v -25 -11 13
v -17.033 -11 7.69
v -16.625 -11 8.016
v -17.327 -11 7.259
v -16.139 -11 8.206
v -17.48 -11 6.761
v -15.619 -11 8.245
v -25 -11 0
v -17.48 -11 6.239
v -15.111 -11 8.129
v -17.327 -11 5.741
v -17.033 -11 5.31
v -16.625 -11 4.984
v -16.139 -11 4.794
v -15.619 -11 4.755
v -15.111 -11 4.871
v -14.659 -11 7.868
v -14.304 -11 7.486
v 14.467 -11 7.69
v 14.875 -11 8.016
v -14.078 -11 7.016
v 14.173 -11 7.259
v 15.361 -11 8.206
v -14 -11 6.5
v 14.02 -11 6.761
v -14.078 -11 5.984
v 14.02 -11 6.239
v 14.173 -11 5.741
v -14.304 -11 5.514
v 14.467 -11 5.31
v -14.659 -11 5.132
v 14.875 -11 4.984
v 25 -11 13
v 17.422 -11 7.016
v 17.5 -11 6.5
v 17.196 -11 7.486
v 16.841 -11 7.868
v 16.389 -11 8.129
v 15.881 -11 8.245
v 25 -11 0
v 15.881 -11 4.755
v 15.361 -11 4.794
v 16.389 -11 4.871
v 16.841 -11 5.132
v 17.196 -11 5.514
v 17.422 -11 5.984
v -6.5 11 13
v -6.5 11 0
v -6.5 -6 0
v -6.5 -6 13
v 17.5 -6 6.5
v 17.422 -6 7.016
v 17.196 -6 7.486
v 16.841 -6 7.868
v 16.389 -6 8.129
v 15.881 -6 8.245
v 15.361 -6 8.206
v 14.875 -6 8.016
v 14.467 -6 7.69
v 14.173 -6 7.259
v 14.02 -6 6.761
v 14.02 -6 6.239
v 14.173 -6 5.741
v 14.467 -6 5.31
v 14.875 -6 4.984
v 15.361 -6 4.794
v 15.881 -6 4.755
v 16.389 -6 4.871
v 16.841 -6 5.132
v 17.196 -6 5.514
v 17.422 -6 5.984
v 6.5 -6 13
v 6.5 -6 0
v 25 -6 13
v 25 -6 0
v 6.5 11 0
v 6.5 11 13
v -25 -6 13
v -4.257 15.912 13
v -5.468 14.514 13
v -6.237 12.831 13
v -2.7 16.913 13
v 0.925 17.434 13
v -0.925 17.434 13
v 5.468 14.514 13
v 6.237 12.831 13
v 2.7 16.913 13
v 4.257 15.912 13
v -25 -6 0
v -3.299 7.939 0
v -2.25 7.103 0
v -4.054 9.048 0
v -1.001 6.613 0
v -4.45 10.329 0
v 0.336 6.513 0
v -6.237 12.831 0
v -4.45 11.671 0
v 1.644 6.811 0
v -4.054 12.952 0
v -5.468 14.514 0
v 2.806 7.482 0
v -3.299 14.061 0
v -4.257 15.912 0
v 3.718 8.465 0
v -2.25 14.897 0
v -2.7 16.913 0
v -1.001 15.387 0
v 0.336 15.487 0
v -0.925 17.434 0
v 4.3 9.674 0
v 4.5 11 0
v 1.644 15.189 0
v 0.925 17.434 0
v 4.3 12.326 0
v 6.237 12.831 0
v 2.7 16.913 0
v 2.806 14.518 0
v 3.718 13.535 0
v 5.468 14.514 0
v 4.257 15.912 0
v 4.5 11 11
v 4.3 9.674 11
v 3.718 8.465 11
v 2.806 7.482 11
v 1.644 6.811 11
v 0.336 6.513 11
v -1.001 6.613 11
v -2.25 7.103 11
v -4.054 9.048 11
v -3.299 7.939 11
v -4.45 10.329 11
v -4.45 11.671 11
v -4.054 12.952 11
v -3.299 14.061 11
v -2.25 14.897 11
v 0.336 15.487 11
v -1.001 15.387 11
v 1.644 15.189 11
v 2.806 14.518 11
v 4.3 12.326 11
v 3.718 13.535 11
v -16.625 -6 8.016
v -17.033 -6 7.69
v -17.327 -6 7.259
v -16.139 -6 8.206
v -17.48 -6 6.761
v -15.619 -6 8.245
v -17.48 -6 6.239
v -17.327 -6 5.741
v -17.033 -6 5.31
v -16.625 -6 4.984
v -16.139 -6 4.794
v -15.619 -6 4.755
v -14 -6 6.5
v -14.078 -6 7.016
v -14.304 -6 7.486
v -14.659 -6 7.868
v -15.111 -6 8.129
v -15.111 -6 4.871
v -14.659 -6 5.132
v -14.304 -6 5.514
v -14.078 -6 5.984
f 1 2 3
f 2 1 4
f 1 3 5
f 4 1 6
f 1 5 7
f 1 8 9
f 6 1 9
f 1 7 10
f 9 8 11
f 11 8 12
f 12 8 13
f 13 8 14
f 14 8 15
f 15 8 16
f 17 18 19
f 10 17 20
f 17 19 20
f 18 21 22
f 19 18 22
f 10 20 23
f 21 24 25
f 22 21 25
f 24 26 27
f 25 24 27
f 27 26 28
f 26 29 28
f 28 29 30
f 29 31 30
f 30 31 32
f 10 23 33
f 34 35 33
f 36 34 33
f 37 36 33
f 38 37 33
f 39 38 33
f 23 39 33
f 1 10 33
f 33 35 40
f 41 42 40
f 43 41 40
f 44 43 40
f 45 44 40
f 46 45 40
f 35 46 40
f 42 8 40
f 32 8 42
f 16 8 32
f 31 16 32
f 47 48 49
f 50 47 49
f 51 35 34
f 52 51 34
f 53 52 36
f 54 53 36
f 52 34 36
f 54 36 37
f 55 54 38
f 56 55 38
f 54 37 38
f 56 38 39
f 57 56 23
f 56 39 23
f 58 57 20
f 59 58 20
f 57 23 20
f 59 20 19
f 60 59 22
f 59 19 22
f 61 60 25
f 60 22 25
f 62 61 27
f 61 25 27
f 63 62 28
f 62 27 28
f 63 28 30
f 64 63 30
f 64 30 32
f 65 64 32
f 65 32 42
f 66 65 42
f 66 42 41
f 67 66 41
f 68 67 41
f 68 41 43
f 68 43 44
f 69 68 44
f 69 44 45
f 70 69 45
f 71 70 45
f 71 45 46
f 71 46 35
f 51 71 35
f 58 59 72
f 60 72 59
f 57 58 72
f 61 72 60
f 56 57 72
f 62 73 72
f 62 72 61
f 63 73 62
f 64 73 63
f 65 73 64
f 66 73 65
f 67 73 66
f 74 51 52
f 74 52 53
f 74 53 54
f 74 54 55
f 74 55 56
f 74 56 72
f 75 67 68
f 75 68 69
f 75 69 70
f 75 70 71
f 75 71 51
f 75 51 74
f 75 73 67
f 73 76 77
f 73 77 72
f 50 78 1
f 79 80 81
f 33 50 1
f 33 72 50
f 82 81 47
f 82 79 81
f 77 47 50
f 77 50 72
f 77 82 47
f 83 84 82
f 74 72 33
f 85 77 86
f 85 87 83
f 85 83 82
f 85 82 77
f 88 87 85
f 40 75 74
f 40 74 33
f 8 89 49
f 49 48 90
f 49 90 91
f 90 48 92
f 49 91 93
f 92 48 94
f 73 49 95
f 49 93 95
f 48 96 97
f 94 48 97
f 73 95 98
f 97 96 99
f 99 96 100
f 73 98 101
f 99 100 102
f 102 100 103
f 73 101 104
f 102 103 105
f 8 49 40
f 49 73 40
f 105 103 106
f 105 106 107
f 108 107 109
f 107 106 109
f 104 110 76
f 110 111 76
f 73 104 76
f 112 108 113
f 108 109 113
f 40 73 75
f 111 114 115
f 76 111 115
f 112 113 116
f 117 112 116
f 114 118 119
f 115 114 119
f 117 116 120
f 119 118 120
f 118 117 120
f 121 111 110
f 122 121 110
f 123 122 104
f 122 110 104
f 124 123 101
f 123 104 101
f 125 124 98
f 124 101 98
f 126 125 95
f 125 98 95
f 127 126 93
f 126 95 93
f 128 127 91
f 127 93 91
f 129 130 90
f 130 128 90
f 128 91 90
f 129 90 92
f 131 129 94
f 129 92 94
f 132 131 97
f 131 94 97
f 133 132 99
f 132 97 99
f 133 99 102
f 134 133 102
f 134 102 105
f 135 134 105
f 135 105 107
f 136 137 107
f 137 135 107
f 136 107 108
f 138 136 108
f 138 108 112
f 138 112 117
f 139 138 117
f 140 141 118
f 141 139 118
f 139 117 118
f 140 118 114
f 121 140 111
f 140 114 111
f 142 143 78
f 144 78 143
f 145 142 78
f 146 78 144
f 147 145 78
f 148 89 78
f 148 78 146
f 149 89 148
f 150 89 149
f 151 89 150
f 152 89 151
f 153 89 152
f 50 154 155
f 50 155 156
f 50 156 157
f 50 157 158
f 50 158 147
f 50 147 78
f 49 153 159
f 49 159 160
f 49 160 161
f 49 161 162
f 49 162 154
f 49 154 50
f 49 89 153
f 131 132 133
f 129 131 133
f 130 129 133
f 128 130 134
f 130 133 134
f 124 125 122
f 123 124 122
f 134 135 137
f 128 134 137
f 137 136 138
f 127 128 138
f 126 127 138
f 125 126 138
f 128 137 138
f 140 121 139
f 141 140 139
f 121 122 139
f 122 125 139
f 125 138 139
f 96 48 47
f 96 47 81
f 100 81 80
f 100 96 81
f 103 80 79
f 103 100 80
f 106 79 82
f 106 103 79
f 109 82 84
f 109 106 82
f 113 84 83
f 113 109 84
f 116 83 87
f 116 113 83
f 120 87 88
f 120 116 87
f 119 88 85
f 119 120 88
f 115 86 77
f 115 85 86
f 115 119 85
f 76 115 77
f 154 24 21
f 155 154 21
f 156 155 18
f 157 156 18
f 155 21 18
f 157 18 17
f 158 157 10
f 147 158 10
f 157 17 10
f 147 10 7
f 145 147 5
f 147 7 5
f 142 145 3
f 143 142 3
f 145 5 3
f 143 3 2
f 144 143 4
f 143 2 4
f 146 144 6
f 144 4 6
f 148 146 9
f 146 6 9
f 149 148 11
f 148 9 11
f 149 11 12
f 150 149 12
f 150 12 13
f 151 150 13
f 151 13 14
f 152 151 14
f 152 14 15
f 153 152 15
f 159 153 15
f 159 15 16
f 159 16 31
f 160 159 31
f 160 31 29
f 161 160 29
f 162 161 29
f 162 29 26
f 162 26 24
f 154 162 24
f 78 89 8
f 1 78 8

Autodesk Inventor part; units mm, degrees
ref_plane "YZ Plane" through (0, 0, 0) normal (1, 0, 0) x (0, 1, 0)
ref_plane "XZ Plane" through (0, 0, 0) normal (0, 1, 0) x (-1, 0, 0)
sketch "Sketch1" plane through (0, 0, 0) normal (0, 0, 1) x (1, 0, 0)
  circle A0 centre (0, 11) radius 4 construction
  circle A1 centre (0, 11) radius 4.5
  line L0 (200.3677, 25.2343) -> (-185.7345, -79.2887) construction
  line L1 (200.3677, 25.2343) -> (210.1768, -11) construction
  line L2 (-204.2212, -11) -> (210.1768, -11) construction
  line L3 (-185.7345, -79.2887) -> (-204.2212, -11) construction
  arc A2 (6.5, 11) -> (-6.5, 11) centre (0, 11) ccw
  line L4 (6.5, 11) -> (6.5, -6)
  line L5 (-6.5, 11) -> (-6.5, -6)
  line L6 (25, -6) -> (25, -11)
  line L7 (-25, -6) -> (-25, -11)
  line L8 (-25, -11) -> (25, -11)
  line L9 (-25, -6) -> (-6.5, -6)
  line L10 (6.5, -6) -> (25, -6)
  point P0 (0, 0)
  dimension "d0" = 0.5
  dimension "d1" = 2
  dimension "d3" = 18.5
  dimension "d4" = 13
  dimension "d5" = 18.5
  dimension "d6" = 5
  dimension "d7" = 5
  dimension "d20" = 22
  dimension "d21" = 11
  dimension "d22" = 25
  dimension "d23" = 50
ref_plane "Work Plane1" through (-2, -2, 20) normal (0, 0, 1) x (1, 0, 0)
extrude "Tykkelse" add sketch "Sketch1" along normal blind 13
sketch "Sketch2" plane through (-25, -11, 0) normal (0, -1, 0) x (1, 0, 0)
  line L0 (0, 13) -> (50, 13) projected
  line L1 (0, 0) -> (0, 13) projected
  line L2 (18.5, 0) -> (0, 0) projected
  line L3 (0, 0) -> (0, 13) projected
  line L4 (18.5, 13) -> (0, 13) projected
  line L5 (18.5, 0) -> (18.5, 13) projected
  line L6 (50, 0) -> (31.5, 0) projected
  line L7 (31.5, 0) -> (31.5, 13) projected
  line L8 (50, 13) -> (31.5, 13) projected
  line L9 (50, 0) -> (50, 13) projected
  circle A0 centre (9.25, 6.5) radius 1.75
  circle A1 centre (40.75, 6.5) radius 1.75
  point P0 (25, 0)
  dimension "d10" = 3.5
  dimension "d11" = 3.5
  dimension "d12" = 9.25
  dimension "d13" = 9.25
  dimension "d14" = 6.5
  dimension "d15" = 6.5
  dimension "d16" = 9.25
  dimension "d17" = 6.5
extrude "Monteringshuller" cut sketch "Sketch2" against normal up to surface (5 mm away) contours A0 | A1
sketch "Sketch3" plane through (0, 0, 13) normal (0, 0, 1) x (1, 0, 0)
  circle A0 centre (0, 11) radius 4.5 construction
  arc A1 (6.5, 11) -> (-6.5, 11) centre (0, 11) ccw construction
  line L0 (-6.5, 11) -> (-6.5, -6) construction
  line L1 (-6.5, -6) -> (-25, -6) construction
  line L2 (-25, -6) -> (-25, -11) construction
  line L3 (-25, -11) -> (25, -11) construction
  line L4 (25, -11) -> (25, -6) construction
  line L5 (25, -6) -> (6.5, -6) construction
  line L6 (6.5, -6) -> (6.5, 11) construction
  circle A2 centre (0, 11) radius 4.5
  point P0 (0, 0)
extrude "Fyld hul" add sketch "Sketch3" against normal blind 2
equation "\"d5\" = d3"
equation "\"d7\" = d6"
equation "\"d21\" = 0.5 * d20"
equation "\"d22\" = 0.5 * d23"
equation "\"d11\" = d10"
equation "\"d12\" = d13"
equation "\"d14\" = d15"
equation "\"d16\" = d12"
equation "\"d17\" = d14"
properties part number "Z-Gevind-Holder" material "PC/ABS Plastic"
